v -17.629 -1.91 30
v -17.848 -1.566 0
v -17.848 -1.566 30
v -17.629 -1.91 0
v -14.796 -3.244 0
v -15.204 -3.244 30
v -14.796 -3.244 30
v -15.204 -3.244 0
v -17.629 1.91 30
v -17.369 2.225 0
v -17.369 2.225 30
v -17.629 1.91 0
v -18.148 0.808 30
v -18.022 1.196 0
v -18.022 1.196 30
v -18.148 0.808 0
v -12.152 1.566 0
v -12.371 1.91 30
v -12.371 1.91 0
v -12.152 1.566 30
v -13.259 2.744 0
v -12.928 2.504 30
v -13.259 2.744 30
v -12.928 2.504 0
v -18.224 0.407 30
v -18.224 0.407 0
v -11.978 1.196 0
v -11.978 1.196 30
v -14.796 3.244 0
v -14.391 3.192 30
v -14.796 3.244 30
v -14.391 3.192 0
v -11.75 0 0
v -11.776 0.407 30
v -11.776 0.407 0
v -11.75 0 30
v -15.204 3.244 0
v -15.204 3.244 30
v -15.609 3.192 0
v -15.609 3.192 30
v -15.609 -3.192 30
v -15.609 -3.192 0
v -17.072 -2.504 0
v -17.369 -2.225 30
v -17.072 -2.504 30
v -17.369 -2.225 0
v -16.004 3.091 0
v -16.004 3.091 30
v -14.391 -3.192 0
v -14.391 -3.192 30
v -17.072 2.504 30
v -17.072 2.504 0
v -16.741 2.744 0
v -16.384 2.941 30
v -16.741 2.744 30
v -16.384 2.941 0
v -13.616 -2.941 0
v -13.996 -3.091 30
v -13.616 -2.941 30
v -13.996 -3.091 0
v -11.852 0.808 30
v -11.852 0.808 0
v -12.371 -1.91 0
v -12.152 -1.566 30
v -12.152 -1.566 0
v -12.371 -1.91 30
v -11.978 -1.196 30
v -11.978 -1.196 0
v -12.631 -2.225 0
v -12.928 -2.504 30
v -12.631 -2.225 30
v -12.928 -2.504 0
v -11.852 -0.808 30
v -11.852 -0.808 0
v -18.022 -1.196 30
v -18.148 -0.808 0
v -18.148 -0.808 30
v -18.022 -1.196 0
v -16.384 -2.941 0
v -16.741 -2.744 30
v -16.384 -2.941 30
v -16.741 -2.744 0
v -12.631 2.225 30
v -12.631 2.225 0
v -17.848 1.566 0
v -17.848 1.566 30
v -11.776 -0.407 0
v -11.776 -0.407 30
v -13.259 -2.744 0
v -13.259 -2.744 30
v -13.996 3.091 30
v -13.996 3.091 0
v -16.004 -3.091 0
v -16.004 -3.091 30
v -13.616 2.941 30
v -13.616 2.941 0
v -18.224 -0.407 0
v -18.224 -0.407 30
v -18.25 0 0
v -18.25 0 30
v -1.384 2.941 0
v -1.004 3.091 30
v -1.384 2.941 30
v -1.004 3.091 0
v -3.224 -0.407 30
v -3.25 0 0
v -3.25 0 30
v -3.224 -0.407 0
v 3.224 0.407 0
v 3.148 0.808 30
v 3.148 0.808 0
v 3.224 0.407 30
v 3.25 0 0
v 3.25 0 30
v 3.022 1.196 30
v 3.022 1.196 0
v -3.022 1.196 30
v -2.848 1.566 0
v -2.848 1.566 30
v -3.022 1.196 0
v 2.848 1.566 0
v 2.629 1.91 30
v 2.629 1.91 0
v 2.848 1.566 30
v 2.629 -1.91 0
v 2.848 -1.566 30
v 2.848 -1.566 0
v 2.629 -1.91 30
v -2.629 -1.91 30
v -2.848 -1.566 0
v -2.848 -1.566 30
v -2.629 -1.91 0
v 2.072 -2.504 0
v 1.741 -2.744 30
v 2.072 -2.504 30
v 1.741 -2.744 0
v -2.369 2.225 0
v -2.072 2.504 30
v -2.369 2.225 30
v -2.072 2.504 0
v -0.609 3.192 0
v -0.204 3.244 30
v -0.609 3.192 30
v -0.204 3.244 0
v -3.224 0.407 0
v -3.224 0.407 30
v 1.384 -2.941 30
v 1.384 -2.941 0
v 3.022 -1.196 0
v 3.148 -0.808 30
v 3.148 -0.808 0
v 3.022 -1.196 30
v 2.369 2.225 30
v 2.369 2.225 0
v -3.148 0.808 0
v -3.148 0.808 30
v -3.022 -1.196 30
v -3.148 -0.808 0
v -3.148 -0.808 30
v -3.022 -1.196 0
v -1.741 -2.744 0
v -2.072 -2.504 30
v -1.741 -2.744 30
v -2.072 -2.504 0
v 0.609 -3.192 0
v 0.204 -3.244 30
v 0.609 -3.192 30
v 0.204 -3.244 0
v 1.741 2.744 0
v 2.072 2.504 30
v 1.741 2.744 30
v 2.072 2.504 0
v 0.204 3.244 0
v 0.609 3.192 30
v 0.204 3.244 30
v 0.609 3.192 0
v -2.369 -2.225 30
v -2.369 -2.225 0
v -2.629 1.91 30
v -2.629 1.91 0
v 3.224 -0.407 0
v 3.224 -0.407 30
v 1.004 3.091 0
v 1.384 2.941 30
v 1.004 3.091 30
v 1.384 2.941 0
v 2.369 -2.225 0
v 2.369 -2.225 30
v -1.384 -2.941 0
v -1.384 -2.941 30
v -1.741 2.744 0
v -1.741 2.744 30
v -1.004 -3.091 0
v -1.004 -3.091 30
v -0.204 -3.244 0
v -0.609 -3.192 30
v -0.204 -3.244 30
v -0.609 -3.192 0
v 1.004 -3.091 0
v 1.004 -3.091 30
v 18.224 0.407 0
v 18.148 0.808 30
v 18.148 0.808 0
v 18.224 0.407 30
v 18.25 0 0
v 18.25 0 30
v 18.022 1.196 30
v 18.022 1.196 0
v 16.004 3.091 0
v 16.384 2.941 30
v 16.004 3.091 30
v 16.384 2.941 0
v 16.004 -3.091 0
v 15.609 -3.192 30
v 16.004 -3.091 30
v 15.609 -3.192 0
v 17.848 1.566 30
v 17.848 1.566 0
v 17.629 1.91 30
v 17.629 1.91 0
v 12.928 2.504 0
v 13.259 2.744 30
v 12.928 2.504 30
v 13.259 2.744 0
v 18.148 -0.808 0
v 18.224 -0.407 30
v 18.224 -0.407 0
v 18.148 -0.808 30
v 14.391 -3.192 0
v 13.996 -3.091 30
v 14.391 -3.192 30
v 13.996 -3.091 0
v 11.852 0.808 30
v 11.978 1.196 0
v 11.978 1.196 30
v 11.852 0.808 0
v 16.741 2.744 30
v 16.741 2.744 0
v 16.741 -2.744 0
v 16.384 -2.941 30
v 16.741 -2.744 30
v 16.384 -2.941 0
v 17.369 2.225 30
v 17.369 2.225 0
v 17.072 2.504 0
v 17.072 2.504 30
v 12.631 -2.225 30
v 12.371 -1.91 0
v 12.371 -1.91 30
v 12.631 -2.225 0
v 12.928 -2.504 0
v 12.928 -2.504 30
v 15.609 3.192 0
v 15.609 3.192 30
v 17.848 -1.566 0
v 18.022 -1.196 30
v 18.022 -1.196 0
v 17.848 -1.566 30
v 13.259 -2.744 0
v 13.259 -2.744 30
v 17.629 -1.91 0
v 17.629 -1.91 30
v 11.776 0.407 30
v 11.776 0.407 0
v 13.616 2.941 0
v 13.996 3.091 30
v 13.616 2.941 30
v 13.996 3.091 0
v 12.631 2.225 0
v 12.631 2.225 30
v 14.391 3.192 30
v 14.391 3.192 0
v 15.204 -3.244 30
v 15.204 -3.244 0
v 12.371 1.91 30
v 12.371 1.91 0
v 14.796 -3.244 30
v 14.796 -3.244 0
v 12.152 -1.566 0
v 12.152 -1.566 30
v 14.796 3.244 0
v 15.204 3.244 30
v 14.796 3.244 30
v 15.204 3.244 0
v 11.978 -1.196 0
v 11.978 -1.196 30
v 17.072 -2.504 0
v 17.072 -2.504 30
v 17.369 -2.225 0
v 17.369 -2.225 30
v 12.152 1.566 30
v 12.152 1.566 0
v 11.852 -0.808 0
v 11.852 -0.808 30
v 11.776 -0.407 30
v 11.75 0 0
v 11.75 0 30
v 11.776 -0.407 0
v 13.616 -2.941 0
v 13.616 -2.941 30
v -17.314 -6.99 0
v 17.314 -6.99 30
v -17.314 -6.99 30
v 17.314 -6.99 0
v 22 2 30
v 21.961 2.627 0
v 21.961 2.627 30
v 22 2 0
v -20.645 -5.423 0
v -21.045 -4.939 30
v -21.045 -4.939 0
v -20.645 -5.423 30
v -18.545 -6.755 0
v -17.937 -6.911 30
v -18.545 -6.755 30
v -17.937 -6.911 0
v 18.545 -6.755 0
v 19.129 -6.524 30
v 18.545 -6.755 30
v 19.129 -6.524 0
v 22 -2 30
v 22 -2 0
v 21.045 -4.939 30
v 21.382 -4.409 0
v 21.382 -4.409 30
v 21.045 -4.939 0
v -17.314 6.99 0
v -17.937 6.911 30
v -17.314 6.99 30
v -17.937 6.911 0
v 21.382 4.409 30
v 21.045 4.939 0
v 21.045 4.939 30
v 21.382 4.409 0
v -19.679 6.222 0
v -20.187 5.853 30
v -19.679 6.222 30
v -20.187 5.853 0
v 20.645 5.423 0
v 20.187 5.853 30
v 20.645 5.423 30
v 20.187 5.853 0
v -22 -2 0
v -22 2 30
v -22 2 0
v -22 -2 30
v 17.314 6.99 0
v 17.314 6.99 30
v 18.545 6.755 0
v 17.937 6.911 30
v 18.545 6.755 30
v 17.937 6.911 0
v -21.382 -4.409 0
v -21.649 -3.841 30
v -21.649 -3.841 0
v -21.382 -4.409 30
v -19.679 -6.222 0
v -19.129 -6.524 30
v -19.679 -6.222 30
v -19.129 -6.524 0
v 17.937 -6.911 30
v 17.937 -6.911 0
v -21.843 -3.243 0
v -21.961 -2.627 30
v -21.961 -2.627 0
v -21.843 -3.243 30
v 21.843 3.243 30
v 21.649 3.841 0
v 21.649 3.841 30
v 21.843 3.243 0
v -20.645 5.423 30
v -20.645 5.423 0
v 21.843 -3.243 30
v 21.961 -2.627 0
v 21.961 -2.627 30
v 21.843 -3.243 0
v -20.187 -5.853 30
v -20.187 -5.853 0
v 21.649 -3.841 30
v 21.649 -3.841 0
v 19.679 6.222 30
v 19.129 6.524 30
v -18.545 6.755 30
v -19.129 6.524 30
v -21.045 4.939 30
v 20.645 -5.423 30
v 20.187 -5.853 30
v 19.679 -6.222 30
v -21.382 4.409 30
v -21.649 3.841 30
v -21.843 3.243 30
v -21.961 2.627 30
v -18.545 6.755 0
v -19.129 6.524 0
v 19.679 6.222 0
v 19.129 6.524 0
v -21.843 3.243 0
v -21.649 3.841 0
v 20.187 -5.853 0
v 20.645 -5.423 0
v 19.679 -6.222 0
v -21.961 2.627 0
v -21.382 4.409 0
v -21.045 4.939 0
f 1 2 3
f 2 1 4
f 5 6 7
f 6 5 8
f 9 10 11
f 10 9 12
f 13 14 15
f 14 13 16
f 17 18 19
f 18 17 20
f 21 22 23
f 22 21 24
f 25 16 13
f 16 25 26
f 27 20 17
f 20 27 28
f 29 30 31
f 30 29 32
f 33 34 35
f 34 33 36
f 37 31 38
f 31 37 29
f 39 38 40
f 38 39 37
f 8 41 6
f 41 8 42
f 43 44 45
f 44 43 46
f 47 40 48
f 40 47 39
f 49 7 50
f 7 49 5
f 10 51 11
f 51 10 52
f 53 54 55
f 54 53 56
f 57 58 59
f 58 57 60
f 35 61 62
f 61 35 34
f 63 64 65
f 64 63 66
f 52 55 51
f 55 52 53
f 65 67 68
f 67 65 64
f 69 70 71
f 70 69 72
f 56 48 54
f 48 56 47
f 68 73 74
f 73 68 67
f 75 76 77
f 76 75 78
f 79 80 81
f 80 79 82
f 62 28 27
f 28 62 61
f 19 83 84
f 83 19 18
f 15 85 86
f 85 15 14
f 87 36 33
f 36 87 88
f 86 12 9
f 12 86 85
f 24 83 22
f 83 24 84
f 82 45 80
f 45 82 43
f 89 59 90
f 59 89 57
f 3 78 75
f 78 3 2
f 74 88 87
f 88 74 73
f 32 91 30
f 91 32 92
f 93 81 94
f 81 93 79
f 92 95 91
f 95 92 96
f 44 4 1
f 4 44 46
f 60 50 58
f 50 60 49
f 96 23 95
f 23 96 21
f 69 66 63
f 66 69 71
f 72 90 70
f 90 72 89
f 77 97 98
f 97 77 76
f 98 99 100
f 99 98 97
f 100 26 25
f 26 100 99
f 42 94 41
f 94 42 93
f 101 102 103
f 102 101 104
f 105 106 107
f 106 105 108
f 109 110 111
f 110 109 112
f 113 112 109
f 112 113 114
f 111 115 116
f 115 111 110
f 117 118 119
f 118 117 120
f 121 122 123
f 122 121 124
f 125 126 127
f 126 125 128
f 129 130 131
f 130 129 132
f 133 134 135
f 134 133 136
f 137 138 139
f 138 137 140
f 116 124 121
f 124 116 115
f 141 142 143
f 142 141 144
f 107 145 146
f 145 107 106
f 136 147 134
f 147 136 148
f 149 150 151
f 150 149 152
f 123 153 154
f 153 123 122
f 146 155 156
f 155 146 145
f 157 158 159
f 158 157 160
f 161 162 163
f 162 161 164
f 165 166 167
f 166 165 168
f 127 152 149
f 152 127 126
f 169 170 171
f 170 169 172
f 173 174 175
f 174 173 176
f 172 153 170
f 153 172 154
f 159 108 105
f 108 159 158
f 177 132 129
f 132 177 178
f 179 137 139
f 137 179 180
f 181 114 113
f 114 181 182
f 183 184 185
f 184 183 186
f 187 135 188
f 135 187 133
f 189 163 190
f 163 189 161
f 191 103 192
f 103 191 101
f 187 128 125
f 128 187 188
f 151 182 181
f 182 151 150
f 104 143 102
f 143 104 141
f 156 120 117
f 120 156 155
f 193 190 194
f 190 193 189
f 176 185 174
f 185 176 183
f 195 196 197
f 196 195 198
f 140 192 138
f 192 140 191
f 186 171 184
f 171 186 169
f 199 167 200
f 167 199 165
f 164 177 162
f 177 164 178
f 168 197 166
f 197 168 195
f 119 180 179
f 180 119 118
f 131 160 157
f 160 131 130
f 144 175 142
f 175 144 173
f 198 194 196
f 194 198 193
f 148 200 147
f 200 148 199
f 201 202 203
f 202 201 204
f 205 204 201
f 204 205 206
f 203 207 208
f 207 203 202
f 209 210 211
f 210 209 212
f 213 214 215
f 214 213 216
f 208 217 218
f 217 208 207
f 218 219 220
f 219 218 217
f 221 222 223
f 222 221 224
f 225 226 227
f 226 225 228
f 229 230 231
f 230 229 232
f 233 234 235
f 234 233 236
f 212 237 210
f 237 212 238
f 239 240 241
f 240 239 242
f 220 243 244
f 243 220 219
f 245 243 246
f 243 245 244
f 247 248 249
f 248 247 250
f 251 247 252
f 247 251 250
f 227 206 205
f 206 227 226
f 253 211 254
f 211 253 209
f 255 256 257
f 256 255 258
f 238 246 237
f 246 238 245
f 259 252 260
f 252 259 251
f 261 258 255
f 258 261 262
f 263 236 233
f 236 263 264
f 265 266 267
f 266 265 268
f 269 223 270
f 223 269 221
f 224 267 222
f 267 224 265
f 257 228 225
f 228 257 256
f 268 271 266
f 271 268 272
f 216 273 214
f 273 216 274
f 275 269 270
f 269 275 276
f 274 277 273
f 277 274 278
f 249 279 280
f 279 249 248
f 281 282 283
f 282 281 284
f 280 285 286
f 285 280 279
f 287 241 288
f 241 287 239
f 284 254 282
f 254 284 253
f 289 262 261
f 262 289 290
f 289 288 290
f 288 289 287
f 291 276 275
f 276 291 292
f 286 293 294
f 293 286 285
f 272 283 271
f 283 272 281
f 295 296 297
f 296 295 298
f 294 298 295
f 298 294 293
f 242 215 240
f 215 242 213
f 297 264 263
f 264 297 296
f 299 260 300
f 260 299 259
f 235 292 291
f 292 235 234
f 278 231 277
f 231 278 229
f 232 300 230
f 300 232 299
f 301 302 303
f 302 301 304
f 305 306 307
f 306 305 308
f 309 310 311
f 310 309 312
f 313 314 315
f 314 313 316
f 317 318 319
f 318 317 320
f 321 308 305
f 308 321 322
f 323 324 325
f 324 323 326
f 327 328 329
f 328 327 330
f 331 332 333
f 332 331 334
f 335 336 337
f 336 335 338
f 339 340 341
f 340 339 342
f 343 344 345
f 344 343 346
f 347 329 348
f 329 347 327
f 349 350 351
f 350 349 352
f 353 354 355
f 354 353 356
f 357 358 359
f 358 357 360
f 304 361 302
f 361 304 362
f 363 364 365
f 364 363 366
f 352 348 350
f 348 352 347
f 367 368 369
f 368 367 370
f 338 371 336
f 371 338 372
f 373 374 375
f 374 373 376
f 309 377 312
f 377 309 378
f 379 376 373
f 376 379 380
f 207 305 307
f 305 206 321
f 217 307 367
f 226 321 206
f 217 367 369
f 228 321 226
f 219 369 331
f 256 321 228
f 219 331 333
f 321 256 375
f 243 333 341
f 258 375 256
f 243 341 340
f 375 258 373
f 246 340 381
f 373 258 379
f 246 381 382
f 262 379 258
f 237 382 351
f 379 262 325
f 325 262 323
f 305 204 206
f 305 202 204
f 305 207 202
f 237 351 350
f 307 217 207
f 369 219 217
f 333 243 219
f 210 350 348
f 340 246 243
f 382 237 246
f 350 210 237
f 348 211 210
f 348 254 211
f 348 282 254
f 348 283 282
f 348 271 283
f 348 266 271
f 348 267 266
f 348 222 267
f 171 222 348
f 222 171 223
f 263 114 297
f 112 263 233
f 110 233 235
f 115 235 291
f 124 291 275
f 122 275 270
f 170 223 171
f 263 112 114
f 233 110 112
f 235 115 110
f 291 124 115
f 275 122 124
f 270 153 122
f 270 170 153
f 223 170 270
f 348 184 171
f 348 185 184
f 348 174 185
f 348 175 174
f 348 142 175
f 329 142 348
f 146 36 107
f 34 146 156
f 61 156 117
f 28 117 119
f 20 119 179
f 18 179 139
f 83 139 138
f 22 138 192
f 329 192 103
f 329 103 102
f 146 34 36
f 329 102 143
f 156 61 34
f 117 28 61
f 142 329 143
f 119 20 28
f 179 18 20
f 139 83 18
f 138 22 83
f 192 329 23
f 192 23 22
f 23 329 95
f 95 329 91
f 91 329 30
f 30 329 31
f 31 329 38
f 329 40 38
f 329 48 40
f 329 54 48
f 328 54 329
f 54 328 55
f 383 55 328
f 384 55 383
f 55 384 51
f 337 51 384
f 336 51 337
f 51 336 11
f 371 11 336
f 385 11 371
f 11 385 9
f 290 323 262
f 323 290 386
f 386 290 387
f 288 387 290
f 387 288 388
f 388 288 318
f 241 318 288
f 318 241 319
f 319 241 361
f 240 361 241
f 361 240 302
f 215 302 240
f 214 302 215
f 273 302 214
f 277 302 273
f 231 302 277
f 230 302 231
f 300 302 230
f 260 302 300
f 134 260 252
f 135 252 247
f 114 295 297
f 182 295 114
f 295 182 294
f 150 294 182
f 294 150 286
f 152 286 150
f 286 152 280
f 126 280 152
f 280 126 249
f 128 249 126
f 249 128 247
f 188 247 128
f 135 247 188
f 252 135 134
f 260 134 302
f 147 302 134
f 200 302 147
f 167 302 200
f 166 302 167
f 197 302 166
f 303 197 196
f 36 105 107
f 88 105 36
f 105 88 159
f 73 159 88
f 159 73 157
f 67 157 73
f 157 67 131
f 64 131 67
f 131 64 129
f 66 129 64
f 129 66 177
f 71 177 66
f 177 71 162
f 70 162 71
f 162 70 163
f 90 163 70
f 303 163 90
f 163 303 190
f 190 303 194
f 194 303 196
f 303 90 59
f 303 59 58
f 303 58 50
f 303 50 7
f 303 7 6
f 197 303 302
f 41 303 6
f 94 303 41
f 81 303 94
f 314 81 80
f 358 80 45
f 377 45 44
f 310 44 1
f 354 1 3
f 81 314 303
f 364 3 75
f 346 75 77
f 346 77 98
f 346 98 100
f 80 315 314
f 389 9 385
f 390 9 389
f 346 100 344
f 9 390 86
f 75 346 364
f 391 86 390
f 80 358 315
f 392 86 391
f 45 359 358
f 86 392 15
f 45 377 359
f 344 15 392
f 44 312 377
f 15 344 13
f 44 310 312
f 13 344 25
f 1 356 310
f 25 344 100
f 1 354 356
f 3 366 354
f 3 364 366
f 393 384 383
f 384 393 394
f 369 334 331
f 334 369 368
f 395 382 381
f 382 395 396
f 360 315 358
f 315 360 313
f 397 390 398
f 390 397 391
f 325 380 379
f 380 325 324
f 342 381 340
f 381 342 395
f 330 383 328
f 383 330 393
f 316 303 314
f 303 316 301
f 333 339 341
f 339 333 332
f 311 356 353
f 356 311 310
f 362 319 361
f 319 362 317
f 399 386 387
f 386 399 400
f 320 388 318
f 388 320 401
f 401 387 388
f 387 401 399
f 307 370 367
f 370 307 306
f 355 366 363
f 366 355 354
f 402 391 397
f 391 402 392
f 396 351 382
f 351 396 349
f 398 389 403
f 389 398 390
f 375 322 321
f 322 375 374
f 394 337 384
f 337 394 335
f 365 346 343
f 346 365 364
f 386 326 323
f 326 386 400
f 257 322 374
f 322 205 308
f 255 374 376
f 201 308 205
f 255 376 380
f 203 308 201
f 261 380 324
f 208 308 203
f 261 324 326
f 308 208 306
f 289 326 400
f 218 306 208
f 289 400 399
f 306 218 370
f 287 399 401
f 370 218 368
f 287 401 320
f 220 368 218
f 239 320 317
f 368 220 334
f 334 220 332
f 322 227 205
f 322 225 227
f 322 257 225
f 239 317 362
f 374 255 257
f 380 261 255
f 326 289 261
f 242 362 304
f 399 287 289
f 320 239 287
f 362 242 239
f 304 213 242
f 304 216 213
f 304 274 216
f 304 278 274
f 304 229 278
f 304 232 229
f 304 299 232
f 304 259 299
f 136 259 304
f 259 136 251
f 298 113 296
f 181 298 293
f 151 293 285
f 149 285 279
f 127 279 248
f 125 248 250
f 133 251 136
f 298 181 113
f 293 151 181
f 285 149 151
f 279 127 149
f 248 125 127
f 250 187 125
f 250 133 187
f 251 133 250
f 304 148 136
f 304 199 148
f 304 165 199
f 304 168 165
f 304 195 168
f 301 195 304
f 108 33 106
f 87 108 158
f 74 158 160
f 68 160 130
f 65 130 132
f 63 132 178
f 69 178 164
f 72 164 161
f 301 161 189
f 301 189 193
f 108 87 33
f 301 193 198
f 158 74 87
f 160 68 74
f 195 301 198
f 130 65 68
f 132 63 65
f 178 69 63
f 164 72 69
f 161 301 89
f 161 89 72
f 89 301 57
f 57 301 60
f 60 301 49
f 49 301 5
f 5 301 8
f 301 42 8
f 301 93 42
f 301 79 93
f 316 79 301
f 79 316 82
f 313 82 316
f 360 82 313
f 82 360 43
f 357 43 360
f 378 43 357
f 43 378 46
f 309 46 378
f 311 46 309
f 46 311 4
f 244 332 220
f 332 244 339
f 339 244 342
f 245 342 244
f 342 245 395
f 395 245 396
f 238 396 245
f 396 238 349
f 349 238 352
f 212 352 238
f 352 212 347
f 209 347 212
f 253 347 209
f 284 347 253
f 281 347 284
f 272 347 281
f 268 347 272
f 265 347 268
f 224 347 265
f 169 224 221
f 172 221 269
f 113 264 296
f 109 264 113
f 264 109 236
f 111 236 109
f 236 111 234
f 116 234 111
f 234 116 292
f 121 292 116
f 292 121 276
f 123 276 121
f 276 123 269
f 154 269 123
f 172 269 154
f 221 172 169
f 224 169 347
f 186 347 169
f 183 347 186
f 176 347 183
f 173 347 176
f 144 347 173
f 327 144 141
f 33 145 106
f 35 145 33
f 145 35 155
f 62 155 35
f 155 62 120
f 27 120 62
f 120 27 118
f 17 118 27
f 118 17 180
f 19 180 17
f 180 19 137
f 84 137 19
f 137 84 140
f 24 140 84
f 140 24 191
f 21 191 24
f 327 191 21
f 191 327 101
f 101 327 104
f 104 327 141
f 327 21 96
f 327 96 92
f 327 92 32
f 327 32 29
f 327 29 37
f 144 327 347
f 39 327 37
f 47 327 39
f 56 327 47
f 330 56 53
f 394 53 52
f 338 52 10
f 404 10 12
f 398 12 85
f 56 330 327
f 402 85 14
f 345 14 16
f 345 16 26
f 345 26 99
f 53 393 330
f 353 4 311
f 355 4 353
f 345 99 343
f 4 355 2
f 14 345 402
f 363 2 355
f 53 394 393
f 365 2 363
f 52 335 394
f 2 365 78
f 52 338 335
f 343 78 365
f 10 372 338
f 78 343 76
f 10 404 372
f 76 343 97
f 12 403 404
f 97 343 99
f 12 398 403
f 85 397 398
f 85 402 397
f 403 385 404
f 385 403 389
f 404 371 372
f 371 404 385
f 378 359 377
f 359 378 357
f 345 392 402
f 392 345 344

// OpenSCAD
$fn = 50;


difference() {
	union() {
		hull() {
			translate(v = [-17.0000000000, 2.0000000000, 0]) {
				cylinder(h = 30, r = 5);
			}
			translate(v = [17.0000000000, 2.0000000000, 0]) {
				cylinder(h = 30, r = 5);
			}
			translate(v = [-17.0000000000, -2.0000000000, 0]) {
				cylinder(h = 30, r = 5);
			}
			translate(v = [17.0000000000, -2.0000000000, 0]) {
				cylinder(h = 30, r = 5);
			}
		}
	}
	union() {
		translate(v = [-15.0000000000, 0.0000000000, 0]) {
			translate(v = [0, 0, -100]) {
				cylinder(h = 200, r = 3.2500000000);
			}
		}
		translate(v = [0, 0, -100]) {
			cylinder(h = 200, r = 3.2500000000);
		}
		translate(v = [15.0000000000, 0.0000000000, 0]) {
			translate(v = [0, 0, -100]) {
				cylinder(h = 200, r = 3.2500000000);
			}
		}
	}
}
